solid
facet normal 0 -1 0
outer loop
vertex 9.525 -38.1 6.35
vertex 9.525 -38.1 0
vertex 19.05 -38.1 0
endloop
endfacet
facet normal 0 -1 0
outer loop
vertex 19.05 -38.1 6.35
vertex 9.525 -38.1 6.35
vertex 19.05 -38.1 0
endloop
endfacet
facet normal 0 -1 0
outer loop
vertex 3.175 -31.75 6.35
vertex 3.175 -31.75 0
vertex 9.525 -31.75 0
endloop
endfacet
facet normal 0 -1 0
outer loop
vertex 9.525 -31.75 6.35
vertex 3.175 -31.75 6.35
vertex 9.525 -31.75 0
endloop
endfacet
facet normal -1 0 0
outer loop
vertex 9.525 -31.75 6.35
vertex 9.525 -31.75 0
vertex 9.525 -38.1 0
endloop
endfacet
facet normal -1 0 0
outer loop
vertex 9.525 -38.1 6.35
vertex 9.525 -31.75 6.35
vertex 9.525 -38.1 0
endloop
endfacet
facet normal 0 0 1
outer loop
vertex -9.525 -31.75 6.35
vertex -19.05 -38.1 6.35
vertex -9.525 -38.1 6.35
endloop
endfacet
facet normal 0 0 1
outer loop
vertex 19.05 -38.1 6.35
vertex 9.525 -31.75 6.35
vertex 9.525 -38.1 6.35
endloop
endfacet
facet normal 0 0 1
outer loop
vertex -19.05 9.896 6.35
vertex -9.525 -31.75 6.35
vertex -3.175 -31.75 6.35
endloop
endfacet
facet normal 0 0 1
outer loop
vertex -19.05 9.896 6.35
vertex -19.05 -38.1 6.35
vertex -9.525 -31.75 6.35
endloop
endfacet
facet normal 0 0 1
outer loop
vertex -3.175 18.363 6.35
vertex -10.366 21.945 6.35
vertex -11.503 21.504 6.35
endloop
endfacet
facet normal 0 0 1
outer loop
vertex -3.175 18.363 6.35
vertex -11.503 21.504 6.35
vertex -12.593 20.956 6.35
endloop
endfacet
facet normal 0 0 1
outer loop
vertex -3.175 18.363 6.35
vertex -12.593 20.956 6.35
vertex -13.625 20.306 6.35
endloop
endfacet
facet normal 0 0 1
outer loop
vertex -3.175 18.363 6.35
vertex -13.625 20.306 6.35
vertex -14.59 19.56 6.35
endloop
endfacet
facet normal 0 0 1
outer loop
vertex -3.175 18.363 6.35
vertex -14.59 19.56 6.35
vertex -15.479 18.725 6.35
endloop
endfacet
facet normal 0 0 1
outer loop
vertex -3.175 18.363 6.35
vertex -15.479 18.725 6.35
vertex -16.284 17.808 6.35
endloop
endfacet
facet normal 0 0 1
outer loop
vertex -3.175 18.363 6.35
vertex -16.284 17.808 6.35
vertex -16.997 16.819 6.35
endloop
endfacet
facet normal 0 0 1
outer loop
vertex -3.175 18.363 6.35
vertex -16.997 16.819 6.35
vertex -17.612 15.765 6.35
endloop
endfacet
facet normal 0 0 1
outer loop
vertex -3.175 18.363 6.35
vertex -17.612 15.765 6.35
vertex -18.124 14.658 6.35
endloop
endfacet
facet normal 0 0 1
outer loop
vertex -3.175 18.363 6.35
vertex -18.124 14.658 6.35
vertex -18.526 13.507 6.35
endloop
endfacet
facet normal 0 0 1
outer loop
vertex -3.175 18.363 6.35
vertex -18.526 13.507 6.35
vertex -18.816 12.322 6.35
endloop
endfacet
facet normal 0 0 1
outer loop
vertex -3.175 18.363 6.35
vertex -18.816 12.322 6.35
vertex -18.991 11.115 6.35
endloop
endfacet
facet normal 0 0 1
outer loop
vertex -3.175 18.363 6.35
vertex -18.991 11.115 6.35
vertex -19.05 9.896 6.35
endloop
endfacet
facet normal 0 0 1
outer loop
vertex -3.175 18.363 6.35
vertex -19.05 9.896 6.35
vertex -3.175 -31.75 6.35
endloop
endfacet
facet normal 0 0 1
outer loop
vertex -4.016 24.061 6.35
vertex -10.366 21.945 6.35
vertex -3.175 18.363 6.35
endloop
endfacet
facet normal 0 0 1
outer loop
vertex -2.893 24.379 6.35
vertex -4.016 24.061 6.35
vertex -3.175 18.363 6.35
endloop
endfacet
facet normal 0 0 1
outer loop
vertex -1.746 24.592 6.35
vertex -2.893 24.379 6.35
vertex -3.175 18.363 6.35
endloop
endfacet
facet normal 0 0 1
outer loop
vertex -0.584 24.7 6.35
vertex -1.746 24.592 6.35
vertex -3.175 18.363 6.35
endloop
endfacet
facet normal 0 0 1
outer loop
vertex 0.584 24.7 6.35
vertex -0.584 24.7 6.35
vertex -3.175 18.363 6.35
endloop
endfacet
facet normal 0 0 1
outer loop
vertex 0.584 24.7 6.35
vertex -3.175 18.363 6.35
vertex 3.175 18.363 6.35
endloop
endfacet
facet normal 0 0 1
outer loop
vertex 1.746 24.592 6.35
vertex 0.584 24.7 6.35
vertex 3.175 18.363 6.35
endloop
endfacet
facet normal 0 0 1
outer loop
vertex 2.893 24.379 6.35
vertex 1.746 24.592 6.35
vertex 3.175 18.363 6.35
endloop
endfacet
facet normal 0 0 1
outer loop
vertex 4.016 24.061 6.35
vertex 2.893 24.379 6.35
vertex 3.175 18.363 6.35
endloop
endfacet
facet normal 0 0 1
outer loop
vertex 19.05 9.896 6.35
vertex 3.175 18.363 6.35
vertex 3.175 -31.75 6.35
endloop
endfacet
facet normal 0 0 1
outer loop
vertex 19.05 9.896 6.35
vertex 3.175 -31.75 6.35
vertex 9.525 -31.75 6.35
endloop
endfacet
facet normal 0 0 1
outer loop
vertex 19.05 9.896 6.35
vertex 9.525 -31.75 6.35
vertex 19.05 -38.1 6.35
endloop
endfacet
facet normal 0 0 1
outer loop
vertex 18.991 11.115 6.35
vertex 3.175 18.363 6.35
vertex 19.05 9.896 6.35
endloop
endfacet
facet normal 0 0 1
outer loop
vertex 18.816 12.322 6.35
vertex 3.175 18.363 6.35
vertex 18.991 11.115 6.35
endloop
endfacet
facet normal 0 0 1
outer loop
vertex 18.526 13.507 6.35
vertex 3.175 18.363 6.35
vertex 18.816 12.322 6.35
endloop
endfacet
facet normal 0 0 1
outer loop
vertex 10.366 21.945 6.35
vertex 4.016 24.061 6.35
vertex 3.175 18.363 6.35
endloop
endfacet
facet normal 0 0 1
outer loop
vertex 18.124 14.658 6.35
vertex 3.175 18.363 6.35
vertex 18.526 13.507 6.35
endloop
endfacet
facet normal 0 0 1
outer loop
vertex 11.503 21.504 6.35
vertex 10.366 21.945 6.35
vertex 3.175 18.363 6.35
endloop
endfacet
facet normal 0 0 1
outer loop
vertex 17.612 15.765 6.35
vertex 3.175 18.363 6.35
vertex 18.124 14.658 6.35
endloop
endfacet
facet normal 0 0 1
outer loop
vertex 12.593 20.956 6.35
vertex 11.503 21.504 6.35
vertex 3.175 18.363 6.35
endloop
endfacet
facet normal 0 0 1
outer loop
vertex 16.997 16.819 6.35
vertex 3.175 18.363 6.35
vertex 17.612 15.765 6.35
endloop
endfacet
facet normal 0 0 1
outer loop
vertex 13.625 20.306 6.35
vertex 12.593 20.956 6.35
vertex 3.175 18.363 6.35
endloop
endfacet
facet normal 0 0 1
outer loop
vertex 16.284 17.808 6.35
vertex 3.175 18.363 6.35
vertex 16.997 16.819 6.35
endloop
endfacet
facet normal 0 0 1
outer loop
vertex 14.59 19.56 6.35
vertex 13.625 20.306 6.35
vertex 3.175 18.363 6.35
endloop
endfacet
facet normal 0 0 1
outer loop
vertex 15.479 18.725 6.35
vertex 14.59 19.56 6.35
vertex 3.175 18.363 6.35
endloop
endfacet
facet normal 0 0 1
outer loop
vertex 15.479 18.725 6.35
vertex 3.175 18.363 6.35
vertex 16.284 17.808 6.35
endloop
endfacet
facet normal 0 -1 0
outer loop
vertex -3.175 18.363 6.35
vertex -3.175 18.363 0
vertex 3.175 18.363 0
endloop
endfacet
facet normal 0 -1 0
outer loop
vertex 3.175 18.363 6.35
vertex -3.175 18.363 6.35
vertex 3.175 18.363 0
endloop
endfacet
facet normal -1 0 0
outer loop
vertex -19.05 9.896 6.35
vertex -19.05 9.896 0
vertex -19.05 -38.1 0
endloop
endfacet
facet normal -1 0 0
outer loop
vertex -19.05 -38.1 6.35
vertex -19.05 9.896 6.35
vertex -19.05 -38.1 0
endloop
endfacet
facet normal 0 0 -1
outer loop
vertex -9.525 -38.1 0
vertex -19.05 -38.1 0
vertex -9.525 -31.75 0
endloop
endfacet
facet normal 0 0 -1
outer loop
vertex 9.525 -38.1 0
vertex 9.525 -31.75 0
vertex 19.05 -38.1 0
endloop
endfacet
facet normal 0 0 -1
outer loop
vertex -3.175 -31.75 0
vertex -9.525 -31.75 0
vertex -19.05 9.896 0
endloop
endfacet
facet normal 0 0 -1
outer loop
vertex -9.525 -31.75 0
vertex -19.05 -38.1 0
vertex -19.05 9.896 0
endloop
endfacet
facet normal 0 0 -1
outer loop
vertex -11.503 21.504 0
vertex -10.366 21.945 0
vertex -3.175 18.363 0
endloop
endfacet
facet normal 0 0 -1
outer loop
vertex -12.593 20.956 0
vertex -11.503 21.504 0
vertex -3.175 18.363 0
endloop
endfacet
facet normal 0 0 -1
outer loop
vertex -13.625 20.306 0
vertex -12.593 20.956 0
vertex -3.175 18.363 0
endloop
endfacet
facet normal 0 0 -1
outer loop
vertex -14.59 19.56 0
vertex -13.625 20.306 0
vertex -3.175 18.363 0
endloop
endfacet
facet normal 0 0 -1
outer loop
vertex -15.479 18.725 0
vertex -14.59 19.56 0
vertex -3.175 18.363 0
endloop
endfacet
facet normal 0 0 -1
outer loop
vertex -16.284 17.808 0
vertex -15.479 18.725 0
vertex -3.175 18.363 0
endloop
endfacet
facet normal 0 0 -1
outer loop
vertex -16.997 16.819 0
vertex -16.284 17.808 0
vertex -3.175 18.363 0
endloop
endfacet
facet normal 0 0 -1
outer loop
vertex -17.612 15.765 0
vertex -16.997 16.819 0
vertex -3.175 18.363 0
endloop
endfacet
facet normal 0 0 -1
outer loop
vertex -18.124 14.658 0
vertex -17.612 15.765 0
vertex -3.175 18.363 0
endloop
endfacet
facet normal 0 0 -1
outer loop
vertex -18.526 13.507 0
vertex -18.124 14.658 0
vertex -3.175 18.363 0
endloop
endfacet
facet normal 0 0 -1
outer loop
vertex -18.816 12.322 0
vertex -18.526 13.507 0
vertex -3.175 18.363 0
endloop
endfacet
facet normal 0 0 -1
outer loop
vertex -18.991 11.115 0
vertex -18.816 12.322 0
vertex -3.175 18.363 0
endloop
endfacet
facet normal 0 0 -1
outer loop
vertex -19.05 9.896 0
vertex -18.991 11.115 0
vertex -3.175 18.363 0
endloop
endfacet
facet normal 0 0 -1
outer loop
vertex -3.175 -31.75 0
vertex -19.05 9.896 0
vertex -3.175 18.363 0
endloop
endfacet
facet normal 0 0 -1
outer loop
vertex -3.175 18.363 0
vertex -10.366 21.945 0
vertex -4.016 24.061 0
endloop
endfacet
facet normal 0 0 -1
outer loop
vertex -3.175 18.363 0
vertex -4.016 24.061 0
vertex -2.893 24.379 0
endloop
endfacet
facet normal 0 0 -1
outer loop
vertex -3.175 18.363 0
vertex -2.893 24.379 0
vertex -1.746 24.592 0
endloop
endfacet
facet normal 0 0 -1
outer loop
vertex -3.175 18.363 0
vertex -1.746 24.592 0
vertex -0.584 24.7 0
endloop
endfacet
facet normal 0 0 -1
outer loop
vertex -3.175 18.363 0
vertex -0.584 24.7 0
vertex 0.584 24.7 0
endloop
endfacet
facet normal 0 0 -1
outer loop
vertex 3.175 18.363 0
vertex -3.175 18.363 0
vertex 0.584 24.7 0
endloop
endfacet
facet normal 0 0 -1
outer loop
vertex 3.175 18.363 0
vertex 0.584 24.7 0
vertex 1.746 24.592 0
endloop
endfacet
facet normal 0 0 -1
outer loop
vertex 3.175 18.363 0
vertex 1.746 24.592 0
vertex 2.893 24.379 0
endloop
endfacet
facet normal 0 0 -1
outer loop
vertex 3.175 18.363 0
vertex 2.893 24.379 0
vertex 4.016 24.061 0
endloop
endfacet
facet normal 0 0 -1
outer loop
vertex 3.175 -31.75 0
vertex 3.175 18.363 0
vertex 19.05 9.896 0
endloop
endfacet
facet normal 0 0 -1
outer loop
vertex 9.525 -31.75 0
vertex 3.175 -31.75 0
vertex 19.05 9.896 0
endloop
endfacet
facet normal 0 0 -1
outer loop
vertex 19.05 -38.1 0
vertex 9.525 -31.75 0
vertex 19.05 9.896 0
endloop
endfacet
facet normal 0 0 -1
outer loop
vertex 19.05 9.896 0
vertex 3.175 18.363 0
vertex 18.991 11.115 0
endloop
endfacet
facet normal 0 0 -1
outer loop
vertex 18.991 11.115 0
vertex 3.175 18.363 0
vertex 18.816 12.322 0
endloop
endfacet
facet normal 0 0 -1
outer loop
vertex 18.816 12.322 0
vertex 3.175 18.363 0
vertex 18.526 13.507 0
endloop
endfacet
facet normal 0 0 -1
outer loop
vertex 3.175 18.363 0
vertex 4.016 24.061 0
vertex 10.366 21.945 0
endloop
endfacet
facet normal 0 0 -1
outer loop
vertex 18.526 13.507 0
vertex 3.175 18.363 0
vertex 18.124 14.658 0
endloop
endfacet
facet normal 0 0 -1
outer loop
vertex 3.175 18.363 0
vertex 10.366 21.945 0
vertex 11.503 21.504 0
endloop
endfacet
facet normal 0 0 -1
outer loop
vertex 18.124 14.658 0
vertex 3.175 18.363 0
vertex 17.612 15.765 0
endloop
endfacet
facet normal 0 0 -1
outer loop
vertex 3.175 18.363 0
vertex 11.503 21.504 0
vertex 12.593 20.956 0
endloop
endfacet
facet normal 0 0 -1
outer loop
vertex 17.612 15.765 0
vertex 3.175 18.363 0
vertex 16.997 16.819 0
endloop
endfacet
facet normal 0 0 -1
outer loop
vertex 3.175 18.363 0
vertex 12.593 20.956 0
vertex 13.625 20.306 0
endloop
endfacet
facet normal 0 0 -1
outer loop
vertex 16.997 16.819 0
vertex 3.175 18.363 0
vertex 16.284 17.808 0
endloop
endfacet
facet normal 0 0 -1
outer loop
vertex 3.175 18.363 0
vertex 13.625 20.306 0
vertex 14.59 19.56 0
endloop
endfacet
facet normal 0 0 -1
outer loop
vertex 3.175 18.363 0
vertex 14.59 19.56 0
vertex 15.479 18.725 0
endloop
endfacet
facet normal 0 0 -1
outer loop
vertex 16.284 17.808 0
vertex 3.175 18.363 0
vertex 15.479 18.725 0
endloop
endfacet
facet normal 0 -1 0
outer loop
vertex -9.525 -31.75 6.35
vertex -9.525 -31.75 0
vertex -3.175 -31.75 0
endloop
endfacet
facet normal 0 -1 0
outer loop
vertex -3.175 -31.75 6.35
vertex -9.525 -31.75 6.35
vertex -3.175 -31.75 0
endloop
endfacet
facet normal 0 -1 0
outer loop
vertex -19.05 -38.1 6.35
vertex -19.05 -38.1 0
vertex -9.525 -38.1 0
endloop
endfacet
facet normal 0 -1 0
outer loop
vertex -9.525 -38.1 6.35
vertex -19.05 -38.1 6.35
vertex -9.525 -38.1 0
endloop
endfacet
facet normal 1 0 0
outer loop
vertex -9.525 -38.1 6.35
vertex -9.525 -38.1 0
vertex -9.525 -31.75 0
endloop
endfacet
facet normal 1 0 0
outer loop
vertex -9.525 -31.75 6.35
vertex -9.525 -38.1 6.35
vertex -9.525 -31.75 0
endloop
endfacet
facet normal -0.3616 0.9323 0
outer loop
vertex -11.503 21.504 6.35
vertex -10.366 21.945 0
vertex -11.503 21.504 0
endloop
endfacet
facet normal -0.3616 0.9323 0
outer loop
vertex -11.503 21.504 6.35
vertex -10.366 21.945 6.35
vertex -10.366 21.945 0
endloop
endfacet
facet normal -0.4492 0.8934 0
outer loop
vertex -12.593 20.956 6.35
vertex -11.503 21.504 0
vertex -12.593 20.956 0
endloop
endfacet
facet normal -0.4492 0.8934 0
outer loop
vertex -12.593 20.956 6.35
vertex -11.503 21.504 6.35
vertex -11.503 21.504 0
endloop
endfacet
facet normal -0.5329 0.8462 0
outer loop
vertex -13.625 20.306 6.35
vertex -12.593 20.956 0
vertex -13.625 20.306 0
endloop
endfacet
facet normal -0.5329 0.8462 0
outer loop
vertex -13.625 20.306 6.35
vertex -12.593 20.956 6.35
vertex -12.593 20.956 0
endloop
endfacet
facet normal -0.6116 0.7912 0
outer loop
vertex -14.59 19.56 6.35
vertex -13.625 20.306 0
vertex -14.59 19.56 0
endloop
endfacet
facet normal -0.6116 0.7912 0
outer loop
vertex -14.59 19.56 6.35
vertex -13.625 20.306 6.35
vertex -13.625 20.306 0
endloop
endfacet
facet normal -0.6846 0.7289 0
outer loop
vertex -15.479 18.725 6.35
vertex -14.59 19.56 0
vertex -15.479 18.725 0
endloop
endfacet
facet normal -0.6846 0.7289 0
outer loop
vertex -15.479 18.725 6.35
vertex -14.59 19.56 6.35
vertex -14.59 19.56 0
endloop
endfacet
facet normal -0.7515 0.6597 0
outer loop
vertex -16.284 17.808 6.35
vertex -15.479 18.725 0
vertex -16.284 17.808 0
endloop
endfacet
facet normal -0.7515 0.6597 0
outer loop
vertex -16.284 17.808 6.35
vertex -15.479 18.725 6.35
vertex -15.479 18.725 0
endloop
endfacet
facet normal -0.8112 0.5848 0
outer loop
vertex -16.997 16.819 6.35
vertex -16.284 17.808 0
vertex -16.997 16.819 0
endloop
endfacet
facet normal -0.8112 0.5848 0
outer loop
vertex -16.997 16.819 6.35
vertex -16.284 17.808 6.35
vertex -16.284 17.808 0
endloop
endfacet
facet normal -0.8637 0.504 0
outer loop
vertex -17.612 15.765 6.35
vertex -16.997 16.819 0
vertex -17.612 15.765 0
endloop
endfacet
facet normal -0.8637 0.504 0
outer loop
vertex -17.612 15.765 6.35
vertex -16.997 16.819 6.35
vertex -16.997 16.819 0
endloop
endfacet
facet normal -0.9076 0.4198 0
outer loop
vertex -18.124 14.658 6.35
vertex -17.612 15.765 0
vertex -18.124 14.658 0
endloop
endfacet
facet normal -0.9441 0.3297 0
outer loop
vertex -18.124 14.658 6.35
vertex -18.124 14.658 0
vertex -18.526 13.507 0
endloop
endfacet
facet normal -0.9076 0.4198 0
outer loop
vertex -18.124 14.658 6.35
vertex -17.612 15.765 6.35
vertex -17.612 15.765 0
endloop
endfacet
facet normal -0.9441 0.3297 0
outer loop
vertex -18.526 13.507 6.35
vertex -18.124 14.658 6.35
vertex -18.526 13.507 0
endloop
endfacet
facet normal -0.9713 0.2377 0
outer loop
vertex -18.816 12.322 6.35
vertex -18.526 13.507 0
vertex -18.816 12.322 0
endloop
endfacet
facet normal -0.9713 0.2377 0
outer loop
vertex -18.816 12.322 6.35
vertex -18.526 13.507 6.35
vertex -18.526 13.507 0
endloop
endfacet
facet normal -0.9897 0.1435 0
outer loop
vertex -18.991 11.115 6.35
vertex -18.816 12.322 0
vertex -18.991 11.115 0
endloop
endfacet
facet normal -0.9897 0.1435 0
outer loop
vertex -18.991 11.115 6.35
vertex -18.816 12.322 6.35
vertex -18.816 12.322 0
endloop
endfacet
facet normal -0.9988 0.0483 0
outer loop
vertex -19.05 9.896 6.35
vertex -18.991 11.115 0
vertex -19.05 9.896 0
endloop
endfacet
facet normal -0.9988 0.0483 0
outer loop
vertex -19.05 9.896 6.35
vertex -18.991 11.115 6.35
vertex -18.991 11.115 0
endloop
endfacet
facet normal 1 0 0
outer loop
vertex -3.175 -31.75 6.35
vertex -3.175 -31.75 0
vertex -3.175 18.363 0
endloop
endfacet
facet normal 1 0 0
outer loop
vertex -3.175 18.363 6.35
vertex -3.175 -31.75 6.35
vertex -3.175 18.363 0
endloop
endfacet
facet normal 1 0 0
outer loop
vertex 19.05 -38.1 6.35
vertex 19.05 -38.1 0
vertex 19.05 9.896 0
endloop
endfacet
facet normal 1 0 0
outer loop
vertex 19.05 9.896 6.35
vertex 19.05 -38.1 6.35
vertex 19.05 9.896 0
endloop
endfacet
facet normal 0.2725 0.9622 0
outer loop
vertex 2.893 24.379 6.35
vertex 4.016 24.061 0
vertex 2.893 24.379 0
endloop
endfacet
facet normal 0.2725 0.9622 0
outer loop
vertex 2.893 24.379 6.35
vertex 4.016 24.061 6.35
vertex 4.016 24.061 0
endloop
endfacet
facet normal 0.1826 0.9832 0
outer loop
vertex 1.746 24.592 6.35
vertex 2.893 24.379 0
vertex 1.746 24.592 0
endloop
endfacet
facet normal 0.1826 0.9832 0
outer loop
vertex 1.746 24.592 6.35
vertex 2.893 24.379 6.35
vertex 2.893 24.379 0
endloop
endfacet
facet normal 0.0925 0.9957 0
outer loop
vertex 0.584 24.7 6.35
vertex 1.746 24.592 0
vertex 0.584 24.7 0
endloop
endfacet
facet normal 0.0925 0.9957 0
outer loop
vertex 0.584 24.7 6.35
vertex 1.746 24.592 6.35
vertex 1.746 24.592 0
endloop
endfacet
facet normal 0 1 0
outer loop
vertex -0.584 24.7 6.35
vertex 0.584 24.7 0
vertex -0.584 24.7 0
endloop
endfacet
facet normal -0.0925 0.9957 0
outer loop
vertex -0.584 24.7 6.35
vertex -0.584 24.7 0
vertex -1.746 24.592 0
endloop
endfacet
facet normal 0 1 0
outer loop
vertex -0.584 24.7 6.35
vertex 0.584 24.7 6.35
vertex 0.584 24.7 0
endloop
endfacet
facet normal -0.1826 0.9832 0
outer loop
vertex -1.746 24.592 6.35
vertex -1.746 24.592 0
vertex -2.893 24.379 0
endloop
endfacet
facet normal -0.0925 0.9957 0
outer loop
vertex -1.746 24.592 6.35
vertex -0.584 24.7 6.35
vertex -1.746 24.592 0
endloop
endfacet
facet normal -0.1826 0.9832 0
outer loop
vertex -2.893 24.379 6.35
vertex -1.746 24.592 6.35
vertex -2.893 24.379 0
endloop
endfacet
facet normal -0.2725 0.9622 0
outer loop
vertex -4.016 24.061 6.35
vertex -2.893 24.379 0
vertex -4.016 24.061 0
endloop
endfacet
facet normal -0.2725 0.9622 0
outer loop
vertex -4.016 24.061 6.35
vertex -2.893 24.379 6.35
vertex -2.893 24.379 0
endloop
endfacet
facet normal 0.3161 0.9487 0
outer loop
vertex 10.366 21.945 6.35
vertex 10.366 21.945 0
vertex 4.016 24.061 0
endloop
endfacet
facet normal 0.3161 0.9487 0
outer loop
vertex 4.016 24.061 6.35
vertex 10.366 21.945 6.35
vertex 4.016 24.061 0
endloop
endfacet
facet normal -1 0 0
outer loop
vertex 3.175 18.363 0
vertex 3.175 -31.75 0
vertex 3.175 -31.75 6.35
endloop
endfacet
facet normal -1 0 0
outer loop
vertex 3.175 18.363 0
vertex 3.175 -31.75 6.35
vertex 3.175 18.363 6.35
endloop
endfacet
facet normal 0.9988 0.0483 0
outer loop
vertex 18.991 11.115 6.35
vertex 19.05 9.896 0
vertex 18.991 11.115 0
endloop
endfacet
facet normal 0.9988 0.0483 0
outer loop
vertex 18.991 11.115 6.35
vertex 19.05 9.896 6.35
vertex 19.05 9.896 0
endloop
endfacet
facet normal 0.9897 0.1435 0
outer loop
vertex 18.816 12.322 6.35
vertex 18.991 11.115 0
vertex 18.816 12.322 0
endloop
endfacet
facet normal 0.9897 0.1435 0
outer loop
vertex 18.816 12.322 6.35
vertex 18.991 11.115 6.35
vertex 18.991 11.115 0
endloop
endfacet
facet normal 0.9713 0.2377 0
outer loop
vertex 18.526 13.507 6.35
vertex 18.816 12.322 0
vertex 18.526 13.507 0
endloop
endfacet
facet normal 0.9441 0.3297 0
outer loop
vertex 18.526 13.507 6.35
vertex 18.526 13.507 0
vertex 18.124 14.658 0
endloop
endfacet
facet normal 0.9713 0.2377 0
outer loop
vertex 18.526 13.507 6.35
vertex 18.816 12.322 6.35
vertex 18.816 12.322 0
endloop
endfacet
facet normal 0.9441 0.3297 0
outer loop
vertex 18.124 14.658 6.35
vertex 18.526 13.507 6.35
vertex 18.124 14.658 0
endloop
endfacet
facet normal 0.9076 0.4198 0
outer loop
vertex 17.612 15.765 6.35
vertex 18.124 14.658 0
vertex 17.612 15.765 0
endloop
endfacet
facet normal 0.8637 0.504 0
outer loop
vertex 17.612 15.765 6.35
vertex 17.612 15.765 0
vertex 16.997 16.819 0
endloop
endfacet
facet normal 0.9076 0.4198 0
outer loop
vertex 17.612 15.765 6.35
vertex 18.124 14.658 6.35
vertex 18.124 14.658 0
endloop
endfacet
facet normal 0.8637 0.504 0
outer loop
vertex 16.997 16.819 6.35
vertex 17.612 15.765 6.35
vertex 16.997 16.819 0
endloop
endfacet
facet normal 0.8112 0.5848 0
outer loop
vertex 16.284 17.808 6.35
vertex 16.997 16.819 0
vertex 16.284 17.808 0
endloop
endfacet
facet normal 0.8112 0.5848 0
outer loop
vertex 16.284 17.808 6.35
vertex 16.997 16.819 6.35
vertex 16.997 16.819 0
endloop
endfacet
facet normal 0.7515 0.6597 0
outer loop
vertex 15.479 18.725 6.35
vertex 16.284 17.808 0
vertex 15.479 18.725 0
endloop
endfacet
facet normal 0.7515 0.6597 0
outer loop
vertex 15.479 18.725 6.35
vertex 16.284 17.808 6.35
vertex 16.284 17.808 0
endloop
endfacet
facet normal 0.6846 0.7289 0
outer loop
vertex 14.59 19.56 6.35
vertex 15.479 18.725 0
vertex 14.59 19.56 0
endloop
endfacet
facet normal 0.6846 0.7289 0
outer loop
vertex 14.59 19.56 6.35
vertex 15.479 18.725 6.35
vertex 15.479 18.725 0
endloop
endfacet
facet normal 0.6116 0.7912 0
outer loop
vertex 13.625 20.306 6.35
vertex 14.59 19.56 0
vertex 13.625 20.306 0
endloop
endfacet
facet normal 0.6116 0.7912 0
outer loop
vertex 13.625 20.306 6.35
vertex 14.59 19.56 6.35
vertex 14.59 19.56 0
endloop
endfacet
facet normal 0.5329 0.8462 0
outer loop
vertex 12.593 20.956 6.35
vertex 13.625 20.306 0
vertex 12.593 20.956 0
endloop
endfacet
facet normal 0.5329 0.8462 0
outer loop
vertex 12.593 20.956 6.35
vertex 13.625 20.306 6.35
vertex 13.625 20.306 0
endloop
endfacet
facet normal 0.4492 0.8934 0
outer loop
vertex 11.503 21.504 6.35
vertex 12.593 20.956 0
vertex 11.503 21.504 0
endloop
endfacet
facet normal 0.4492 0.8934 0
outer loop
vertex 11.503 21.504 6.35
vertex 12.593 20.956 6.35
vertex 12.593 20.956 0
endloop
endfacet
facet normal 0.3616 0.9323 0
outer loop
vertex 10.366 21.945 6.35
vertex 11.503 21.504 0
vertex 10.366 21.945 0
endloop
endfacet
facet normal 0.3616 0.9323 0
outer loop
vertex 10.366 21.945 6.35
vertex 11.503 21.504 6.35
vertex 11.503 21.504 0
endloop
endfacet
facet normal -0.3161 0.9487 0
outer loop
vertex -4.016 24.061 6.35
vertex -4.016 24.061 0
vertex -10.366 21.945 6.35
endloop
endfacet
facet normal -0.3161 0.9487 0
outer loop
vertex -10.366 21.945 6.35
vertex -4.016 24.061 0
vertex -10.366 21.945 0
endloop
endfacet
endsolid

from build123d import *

# Parameters (mm, degrees)
BOSS_EXTRUDE1_DEPTH     = 6.35
FILLET1_R               = 12.7
CUT_EXTRUDE1_DEPTH      = 44.067795393
CUT_EXTRUDE1_DEPTH_BACK = 44.067795393
SKETCH2_W               = 6.35
SKETCH2_H               = 50.113024572


with BuildPart() as part:
    # Sketch1 → Boss-Extrude1 (new body)
    with BuildSketch(Plane.XY):
        Polygon((-9.525, -31.75), (9.525, -31.75), (9.525, -38.1), (19.05, -38.1), (19.05, -31.75), (19.05, 19.05), (0, 25.4), (-19.05, 19.05), (-19.05, -31.75), (-19.05, -38.1), (-9.525, -38.1), align=None)
    extrude(amount=BOSS_EXTRUDE1_DEPTH)

    # Fillet1
    fillet1_edges = [part.edges().sort_by_distance(p)[0] for p in [
        (-19.05, 19.05, 3.175),
        (0, 25.4, 3.175),
        (19.05, 19.05, 3.175),
    ]]
    fillet(fillet1_edges, radius=FILLET1_R)

    # Sketch2 → Cut-Extrude1 (cut, two sides: drawn at the far end of the back side and taken through both)
    with BuildSketch(Plane.XY.offset(6.35).offset(-CUT_EXTRUDE1_DEPTH_BACK)):
        with Locations((0, -6.693487714)):
            Rectangle(SKETCH2_W, SKETCH2_H)
    extrude(amount=CUT_EXTRUDE1_DEPTH + CUT_EXTRUDE1_DEPTH_BACK, mode=Mode.SUBTRACT)


solid = part.part
